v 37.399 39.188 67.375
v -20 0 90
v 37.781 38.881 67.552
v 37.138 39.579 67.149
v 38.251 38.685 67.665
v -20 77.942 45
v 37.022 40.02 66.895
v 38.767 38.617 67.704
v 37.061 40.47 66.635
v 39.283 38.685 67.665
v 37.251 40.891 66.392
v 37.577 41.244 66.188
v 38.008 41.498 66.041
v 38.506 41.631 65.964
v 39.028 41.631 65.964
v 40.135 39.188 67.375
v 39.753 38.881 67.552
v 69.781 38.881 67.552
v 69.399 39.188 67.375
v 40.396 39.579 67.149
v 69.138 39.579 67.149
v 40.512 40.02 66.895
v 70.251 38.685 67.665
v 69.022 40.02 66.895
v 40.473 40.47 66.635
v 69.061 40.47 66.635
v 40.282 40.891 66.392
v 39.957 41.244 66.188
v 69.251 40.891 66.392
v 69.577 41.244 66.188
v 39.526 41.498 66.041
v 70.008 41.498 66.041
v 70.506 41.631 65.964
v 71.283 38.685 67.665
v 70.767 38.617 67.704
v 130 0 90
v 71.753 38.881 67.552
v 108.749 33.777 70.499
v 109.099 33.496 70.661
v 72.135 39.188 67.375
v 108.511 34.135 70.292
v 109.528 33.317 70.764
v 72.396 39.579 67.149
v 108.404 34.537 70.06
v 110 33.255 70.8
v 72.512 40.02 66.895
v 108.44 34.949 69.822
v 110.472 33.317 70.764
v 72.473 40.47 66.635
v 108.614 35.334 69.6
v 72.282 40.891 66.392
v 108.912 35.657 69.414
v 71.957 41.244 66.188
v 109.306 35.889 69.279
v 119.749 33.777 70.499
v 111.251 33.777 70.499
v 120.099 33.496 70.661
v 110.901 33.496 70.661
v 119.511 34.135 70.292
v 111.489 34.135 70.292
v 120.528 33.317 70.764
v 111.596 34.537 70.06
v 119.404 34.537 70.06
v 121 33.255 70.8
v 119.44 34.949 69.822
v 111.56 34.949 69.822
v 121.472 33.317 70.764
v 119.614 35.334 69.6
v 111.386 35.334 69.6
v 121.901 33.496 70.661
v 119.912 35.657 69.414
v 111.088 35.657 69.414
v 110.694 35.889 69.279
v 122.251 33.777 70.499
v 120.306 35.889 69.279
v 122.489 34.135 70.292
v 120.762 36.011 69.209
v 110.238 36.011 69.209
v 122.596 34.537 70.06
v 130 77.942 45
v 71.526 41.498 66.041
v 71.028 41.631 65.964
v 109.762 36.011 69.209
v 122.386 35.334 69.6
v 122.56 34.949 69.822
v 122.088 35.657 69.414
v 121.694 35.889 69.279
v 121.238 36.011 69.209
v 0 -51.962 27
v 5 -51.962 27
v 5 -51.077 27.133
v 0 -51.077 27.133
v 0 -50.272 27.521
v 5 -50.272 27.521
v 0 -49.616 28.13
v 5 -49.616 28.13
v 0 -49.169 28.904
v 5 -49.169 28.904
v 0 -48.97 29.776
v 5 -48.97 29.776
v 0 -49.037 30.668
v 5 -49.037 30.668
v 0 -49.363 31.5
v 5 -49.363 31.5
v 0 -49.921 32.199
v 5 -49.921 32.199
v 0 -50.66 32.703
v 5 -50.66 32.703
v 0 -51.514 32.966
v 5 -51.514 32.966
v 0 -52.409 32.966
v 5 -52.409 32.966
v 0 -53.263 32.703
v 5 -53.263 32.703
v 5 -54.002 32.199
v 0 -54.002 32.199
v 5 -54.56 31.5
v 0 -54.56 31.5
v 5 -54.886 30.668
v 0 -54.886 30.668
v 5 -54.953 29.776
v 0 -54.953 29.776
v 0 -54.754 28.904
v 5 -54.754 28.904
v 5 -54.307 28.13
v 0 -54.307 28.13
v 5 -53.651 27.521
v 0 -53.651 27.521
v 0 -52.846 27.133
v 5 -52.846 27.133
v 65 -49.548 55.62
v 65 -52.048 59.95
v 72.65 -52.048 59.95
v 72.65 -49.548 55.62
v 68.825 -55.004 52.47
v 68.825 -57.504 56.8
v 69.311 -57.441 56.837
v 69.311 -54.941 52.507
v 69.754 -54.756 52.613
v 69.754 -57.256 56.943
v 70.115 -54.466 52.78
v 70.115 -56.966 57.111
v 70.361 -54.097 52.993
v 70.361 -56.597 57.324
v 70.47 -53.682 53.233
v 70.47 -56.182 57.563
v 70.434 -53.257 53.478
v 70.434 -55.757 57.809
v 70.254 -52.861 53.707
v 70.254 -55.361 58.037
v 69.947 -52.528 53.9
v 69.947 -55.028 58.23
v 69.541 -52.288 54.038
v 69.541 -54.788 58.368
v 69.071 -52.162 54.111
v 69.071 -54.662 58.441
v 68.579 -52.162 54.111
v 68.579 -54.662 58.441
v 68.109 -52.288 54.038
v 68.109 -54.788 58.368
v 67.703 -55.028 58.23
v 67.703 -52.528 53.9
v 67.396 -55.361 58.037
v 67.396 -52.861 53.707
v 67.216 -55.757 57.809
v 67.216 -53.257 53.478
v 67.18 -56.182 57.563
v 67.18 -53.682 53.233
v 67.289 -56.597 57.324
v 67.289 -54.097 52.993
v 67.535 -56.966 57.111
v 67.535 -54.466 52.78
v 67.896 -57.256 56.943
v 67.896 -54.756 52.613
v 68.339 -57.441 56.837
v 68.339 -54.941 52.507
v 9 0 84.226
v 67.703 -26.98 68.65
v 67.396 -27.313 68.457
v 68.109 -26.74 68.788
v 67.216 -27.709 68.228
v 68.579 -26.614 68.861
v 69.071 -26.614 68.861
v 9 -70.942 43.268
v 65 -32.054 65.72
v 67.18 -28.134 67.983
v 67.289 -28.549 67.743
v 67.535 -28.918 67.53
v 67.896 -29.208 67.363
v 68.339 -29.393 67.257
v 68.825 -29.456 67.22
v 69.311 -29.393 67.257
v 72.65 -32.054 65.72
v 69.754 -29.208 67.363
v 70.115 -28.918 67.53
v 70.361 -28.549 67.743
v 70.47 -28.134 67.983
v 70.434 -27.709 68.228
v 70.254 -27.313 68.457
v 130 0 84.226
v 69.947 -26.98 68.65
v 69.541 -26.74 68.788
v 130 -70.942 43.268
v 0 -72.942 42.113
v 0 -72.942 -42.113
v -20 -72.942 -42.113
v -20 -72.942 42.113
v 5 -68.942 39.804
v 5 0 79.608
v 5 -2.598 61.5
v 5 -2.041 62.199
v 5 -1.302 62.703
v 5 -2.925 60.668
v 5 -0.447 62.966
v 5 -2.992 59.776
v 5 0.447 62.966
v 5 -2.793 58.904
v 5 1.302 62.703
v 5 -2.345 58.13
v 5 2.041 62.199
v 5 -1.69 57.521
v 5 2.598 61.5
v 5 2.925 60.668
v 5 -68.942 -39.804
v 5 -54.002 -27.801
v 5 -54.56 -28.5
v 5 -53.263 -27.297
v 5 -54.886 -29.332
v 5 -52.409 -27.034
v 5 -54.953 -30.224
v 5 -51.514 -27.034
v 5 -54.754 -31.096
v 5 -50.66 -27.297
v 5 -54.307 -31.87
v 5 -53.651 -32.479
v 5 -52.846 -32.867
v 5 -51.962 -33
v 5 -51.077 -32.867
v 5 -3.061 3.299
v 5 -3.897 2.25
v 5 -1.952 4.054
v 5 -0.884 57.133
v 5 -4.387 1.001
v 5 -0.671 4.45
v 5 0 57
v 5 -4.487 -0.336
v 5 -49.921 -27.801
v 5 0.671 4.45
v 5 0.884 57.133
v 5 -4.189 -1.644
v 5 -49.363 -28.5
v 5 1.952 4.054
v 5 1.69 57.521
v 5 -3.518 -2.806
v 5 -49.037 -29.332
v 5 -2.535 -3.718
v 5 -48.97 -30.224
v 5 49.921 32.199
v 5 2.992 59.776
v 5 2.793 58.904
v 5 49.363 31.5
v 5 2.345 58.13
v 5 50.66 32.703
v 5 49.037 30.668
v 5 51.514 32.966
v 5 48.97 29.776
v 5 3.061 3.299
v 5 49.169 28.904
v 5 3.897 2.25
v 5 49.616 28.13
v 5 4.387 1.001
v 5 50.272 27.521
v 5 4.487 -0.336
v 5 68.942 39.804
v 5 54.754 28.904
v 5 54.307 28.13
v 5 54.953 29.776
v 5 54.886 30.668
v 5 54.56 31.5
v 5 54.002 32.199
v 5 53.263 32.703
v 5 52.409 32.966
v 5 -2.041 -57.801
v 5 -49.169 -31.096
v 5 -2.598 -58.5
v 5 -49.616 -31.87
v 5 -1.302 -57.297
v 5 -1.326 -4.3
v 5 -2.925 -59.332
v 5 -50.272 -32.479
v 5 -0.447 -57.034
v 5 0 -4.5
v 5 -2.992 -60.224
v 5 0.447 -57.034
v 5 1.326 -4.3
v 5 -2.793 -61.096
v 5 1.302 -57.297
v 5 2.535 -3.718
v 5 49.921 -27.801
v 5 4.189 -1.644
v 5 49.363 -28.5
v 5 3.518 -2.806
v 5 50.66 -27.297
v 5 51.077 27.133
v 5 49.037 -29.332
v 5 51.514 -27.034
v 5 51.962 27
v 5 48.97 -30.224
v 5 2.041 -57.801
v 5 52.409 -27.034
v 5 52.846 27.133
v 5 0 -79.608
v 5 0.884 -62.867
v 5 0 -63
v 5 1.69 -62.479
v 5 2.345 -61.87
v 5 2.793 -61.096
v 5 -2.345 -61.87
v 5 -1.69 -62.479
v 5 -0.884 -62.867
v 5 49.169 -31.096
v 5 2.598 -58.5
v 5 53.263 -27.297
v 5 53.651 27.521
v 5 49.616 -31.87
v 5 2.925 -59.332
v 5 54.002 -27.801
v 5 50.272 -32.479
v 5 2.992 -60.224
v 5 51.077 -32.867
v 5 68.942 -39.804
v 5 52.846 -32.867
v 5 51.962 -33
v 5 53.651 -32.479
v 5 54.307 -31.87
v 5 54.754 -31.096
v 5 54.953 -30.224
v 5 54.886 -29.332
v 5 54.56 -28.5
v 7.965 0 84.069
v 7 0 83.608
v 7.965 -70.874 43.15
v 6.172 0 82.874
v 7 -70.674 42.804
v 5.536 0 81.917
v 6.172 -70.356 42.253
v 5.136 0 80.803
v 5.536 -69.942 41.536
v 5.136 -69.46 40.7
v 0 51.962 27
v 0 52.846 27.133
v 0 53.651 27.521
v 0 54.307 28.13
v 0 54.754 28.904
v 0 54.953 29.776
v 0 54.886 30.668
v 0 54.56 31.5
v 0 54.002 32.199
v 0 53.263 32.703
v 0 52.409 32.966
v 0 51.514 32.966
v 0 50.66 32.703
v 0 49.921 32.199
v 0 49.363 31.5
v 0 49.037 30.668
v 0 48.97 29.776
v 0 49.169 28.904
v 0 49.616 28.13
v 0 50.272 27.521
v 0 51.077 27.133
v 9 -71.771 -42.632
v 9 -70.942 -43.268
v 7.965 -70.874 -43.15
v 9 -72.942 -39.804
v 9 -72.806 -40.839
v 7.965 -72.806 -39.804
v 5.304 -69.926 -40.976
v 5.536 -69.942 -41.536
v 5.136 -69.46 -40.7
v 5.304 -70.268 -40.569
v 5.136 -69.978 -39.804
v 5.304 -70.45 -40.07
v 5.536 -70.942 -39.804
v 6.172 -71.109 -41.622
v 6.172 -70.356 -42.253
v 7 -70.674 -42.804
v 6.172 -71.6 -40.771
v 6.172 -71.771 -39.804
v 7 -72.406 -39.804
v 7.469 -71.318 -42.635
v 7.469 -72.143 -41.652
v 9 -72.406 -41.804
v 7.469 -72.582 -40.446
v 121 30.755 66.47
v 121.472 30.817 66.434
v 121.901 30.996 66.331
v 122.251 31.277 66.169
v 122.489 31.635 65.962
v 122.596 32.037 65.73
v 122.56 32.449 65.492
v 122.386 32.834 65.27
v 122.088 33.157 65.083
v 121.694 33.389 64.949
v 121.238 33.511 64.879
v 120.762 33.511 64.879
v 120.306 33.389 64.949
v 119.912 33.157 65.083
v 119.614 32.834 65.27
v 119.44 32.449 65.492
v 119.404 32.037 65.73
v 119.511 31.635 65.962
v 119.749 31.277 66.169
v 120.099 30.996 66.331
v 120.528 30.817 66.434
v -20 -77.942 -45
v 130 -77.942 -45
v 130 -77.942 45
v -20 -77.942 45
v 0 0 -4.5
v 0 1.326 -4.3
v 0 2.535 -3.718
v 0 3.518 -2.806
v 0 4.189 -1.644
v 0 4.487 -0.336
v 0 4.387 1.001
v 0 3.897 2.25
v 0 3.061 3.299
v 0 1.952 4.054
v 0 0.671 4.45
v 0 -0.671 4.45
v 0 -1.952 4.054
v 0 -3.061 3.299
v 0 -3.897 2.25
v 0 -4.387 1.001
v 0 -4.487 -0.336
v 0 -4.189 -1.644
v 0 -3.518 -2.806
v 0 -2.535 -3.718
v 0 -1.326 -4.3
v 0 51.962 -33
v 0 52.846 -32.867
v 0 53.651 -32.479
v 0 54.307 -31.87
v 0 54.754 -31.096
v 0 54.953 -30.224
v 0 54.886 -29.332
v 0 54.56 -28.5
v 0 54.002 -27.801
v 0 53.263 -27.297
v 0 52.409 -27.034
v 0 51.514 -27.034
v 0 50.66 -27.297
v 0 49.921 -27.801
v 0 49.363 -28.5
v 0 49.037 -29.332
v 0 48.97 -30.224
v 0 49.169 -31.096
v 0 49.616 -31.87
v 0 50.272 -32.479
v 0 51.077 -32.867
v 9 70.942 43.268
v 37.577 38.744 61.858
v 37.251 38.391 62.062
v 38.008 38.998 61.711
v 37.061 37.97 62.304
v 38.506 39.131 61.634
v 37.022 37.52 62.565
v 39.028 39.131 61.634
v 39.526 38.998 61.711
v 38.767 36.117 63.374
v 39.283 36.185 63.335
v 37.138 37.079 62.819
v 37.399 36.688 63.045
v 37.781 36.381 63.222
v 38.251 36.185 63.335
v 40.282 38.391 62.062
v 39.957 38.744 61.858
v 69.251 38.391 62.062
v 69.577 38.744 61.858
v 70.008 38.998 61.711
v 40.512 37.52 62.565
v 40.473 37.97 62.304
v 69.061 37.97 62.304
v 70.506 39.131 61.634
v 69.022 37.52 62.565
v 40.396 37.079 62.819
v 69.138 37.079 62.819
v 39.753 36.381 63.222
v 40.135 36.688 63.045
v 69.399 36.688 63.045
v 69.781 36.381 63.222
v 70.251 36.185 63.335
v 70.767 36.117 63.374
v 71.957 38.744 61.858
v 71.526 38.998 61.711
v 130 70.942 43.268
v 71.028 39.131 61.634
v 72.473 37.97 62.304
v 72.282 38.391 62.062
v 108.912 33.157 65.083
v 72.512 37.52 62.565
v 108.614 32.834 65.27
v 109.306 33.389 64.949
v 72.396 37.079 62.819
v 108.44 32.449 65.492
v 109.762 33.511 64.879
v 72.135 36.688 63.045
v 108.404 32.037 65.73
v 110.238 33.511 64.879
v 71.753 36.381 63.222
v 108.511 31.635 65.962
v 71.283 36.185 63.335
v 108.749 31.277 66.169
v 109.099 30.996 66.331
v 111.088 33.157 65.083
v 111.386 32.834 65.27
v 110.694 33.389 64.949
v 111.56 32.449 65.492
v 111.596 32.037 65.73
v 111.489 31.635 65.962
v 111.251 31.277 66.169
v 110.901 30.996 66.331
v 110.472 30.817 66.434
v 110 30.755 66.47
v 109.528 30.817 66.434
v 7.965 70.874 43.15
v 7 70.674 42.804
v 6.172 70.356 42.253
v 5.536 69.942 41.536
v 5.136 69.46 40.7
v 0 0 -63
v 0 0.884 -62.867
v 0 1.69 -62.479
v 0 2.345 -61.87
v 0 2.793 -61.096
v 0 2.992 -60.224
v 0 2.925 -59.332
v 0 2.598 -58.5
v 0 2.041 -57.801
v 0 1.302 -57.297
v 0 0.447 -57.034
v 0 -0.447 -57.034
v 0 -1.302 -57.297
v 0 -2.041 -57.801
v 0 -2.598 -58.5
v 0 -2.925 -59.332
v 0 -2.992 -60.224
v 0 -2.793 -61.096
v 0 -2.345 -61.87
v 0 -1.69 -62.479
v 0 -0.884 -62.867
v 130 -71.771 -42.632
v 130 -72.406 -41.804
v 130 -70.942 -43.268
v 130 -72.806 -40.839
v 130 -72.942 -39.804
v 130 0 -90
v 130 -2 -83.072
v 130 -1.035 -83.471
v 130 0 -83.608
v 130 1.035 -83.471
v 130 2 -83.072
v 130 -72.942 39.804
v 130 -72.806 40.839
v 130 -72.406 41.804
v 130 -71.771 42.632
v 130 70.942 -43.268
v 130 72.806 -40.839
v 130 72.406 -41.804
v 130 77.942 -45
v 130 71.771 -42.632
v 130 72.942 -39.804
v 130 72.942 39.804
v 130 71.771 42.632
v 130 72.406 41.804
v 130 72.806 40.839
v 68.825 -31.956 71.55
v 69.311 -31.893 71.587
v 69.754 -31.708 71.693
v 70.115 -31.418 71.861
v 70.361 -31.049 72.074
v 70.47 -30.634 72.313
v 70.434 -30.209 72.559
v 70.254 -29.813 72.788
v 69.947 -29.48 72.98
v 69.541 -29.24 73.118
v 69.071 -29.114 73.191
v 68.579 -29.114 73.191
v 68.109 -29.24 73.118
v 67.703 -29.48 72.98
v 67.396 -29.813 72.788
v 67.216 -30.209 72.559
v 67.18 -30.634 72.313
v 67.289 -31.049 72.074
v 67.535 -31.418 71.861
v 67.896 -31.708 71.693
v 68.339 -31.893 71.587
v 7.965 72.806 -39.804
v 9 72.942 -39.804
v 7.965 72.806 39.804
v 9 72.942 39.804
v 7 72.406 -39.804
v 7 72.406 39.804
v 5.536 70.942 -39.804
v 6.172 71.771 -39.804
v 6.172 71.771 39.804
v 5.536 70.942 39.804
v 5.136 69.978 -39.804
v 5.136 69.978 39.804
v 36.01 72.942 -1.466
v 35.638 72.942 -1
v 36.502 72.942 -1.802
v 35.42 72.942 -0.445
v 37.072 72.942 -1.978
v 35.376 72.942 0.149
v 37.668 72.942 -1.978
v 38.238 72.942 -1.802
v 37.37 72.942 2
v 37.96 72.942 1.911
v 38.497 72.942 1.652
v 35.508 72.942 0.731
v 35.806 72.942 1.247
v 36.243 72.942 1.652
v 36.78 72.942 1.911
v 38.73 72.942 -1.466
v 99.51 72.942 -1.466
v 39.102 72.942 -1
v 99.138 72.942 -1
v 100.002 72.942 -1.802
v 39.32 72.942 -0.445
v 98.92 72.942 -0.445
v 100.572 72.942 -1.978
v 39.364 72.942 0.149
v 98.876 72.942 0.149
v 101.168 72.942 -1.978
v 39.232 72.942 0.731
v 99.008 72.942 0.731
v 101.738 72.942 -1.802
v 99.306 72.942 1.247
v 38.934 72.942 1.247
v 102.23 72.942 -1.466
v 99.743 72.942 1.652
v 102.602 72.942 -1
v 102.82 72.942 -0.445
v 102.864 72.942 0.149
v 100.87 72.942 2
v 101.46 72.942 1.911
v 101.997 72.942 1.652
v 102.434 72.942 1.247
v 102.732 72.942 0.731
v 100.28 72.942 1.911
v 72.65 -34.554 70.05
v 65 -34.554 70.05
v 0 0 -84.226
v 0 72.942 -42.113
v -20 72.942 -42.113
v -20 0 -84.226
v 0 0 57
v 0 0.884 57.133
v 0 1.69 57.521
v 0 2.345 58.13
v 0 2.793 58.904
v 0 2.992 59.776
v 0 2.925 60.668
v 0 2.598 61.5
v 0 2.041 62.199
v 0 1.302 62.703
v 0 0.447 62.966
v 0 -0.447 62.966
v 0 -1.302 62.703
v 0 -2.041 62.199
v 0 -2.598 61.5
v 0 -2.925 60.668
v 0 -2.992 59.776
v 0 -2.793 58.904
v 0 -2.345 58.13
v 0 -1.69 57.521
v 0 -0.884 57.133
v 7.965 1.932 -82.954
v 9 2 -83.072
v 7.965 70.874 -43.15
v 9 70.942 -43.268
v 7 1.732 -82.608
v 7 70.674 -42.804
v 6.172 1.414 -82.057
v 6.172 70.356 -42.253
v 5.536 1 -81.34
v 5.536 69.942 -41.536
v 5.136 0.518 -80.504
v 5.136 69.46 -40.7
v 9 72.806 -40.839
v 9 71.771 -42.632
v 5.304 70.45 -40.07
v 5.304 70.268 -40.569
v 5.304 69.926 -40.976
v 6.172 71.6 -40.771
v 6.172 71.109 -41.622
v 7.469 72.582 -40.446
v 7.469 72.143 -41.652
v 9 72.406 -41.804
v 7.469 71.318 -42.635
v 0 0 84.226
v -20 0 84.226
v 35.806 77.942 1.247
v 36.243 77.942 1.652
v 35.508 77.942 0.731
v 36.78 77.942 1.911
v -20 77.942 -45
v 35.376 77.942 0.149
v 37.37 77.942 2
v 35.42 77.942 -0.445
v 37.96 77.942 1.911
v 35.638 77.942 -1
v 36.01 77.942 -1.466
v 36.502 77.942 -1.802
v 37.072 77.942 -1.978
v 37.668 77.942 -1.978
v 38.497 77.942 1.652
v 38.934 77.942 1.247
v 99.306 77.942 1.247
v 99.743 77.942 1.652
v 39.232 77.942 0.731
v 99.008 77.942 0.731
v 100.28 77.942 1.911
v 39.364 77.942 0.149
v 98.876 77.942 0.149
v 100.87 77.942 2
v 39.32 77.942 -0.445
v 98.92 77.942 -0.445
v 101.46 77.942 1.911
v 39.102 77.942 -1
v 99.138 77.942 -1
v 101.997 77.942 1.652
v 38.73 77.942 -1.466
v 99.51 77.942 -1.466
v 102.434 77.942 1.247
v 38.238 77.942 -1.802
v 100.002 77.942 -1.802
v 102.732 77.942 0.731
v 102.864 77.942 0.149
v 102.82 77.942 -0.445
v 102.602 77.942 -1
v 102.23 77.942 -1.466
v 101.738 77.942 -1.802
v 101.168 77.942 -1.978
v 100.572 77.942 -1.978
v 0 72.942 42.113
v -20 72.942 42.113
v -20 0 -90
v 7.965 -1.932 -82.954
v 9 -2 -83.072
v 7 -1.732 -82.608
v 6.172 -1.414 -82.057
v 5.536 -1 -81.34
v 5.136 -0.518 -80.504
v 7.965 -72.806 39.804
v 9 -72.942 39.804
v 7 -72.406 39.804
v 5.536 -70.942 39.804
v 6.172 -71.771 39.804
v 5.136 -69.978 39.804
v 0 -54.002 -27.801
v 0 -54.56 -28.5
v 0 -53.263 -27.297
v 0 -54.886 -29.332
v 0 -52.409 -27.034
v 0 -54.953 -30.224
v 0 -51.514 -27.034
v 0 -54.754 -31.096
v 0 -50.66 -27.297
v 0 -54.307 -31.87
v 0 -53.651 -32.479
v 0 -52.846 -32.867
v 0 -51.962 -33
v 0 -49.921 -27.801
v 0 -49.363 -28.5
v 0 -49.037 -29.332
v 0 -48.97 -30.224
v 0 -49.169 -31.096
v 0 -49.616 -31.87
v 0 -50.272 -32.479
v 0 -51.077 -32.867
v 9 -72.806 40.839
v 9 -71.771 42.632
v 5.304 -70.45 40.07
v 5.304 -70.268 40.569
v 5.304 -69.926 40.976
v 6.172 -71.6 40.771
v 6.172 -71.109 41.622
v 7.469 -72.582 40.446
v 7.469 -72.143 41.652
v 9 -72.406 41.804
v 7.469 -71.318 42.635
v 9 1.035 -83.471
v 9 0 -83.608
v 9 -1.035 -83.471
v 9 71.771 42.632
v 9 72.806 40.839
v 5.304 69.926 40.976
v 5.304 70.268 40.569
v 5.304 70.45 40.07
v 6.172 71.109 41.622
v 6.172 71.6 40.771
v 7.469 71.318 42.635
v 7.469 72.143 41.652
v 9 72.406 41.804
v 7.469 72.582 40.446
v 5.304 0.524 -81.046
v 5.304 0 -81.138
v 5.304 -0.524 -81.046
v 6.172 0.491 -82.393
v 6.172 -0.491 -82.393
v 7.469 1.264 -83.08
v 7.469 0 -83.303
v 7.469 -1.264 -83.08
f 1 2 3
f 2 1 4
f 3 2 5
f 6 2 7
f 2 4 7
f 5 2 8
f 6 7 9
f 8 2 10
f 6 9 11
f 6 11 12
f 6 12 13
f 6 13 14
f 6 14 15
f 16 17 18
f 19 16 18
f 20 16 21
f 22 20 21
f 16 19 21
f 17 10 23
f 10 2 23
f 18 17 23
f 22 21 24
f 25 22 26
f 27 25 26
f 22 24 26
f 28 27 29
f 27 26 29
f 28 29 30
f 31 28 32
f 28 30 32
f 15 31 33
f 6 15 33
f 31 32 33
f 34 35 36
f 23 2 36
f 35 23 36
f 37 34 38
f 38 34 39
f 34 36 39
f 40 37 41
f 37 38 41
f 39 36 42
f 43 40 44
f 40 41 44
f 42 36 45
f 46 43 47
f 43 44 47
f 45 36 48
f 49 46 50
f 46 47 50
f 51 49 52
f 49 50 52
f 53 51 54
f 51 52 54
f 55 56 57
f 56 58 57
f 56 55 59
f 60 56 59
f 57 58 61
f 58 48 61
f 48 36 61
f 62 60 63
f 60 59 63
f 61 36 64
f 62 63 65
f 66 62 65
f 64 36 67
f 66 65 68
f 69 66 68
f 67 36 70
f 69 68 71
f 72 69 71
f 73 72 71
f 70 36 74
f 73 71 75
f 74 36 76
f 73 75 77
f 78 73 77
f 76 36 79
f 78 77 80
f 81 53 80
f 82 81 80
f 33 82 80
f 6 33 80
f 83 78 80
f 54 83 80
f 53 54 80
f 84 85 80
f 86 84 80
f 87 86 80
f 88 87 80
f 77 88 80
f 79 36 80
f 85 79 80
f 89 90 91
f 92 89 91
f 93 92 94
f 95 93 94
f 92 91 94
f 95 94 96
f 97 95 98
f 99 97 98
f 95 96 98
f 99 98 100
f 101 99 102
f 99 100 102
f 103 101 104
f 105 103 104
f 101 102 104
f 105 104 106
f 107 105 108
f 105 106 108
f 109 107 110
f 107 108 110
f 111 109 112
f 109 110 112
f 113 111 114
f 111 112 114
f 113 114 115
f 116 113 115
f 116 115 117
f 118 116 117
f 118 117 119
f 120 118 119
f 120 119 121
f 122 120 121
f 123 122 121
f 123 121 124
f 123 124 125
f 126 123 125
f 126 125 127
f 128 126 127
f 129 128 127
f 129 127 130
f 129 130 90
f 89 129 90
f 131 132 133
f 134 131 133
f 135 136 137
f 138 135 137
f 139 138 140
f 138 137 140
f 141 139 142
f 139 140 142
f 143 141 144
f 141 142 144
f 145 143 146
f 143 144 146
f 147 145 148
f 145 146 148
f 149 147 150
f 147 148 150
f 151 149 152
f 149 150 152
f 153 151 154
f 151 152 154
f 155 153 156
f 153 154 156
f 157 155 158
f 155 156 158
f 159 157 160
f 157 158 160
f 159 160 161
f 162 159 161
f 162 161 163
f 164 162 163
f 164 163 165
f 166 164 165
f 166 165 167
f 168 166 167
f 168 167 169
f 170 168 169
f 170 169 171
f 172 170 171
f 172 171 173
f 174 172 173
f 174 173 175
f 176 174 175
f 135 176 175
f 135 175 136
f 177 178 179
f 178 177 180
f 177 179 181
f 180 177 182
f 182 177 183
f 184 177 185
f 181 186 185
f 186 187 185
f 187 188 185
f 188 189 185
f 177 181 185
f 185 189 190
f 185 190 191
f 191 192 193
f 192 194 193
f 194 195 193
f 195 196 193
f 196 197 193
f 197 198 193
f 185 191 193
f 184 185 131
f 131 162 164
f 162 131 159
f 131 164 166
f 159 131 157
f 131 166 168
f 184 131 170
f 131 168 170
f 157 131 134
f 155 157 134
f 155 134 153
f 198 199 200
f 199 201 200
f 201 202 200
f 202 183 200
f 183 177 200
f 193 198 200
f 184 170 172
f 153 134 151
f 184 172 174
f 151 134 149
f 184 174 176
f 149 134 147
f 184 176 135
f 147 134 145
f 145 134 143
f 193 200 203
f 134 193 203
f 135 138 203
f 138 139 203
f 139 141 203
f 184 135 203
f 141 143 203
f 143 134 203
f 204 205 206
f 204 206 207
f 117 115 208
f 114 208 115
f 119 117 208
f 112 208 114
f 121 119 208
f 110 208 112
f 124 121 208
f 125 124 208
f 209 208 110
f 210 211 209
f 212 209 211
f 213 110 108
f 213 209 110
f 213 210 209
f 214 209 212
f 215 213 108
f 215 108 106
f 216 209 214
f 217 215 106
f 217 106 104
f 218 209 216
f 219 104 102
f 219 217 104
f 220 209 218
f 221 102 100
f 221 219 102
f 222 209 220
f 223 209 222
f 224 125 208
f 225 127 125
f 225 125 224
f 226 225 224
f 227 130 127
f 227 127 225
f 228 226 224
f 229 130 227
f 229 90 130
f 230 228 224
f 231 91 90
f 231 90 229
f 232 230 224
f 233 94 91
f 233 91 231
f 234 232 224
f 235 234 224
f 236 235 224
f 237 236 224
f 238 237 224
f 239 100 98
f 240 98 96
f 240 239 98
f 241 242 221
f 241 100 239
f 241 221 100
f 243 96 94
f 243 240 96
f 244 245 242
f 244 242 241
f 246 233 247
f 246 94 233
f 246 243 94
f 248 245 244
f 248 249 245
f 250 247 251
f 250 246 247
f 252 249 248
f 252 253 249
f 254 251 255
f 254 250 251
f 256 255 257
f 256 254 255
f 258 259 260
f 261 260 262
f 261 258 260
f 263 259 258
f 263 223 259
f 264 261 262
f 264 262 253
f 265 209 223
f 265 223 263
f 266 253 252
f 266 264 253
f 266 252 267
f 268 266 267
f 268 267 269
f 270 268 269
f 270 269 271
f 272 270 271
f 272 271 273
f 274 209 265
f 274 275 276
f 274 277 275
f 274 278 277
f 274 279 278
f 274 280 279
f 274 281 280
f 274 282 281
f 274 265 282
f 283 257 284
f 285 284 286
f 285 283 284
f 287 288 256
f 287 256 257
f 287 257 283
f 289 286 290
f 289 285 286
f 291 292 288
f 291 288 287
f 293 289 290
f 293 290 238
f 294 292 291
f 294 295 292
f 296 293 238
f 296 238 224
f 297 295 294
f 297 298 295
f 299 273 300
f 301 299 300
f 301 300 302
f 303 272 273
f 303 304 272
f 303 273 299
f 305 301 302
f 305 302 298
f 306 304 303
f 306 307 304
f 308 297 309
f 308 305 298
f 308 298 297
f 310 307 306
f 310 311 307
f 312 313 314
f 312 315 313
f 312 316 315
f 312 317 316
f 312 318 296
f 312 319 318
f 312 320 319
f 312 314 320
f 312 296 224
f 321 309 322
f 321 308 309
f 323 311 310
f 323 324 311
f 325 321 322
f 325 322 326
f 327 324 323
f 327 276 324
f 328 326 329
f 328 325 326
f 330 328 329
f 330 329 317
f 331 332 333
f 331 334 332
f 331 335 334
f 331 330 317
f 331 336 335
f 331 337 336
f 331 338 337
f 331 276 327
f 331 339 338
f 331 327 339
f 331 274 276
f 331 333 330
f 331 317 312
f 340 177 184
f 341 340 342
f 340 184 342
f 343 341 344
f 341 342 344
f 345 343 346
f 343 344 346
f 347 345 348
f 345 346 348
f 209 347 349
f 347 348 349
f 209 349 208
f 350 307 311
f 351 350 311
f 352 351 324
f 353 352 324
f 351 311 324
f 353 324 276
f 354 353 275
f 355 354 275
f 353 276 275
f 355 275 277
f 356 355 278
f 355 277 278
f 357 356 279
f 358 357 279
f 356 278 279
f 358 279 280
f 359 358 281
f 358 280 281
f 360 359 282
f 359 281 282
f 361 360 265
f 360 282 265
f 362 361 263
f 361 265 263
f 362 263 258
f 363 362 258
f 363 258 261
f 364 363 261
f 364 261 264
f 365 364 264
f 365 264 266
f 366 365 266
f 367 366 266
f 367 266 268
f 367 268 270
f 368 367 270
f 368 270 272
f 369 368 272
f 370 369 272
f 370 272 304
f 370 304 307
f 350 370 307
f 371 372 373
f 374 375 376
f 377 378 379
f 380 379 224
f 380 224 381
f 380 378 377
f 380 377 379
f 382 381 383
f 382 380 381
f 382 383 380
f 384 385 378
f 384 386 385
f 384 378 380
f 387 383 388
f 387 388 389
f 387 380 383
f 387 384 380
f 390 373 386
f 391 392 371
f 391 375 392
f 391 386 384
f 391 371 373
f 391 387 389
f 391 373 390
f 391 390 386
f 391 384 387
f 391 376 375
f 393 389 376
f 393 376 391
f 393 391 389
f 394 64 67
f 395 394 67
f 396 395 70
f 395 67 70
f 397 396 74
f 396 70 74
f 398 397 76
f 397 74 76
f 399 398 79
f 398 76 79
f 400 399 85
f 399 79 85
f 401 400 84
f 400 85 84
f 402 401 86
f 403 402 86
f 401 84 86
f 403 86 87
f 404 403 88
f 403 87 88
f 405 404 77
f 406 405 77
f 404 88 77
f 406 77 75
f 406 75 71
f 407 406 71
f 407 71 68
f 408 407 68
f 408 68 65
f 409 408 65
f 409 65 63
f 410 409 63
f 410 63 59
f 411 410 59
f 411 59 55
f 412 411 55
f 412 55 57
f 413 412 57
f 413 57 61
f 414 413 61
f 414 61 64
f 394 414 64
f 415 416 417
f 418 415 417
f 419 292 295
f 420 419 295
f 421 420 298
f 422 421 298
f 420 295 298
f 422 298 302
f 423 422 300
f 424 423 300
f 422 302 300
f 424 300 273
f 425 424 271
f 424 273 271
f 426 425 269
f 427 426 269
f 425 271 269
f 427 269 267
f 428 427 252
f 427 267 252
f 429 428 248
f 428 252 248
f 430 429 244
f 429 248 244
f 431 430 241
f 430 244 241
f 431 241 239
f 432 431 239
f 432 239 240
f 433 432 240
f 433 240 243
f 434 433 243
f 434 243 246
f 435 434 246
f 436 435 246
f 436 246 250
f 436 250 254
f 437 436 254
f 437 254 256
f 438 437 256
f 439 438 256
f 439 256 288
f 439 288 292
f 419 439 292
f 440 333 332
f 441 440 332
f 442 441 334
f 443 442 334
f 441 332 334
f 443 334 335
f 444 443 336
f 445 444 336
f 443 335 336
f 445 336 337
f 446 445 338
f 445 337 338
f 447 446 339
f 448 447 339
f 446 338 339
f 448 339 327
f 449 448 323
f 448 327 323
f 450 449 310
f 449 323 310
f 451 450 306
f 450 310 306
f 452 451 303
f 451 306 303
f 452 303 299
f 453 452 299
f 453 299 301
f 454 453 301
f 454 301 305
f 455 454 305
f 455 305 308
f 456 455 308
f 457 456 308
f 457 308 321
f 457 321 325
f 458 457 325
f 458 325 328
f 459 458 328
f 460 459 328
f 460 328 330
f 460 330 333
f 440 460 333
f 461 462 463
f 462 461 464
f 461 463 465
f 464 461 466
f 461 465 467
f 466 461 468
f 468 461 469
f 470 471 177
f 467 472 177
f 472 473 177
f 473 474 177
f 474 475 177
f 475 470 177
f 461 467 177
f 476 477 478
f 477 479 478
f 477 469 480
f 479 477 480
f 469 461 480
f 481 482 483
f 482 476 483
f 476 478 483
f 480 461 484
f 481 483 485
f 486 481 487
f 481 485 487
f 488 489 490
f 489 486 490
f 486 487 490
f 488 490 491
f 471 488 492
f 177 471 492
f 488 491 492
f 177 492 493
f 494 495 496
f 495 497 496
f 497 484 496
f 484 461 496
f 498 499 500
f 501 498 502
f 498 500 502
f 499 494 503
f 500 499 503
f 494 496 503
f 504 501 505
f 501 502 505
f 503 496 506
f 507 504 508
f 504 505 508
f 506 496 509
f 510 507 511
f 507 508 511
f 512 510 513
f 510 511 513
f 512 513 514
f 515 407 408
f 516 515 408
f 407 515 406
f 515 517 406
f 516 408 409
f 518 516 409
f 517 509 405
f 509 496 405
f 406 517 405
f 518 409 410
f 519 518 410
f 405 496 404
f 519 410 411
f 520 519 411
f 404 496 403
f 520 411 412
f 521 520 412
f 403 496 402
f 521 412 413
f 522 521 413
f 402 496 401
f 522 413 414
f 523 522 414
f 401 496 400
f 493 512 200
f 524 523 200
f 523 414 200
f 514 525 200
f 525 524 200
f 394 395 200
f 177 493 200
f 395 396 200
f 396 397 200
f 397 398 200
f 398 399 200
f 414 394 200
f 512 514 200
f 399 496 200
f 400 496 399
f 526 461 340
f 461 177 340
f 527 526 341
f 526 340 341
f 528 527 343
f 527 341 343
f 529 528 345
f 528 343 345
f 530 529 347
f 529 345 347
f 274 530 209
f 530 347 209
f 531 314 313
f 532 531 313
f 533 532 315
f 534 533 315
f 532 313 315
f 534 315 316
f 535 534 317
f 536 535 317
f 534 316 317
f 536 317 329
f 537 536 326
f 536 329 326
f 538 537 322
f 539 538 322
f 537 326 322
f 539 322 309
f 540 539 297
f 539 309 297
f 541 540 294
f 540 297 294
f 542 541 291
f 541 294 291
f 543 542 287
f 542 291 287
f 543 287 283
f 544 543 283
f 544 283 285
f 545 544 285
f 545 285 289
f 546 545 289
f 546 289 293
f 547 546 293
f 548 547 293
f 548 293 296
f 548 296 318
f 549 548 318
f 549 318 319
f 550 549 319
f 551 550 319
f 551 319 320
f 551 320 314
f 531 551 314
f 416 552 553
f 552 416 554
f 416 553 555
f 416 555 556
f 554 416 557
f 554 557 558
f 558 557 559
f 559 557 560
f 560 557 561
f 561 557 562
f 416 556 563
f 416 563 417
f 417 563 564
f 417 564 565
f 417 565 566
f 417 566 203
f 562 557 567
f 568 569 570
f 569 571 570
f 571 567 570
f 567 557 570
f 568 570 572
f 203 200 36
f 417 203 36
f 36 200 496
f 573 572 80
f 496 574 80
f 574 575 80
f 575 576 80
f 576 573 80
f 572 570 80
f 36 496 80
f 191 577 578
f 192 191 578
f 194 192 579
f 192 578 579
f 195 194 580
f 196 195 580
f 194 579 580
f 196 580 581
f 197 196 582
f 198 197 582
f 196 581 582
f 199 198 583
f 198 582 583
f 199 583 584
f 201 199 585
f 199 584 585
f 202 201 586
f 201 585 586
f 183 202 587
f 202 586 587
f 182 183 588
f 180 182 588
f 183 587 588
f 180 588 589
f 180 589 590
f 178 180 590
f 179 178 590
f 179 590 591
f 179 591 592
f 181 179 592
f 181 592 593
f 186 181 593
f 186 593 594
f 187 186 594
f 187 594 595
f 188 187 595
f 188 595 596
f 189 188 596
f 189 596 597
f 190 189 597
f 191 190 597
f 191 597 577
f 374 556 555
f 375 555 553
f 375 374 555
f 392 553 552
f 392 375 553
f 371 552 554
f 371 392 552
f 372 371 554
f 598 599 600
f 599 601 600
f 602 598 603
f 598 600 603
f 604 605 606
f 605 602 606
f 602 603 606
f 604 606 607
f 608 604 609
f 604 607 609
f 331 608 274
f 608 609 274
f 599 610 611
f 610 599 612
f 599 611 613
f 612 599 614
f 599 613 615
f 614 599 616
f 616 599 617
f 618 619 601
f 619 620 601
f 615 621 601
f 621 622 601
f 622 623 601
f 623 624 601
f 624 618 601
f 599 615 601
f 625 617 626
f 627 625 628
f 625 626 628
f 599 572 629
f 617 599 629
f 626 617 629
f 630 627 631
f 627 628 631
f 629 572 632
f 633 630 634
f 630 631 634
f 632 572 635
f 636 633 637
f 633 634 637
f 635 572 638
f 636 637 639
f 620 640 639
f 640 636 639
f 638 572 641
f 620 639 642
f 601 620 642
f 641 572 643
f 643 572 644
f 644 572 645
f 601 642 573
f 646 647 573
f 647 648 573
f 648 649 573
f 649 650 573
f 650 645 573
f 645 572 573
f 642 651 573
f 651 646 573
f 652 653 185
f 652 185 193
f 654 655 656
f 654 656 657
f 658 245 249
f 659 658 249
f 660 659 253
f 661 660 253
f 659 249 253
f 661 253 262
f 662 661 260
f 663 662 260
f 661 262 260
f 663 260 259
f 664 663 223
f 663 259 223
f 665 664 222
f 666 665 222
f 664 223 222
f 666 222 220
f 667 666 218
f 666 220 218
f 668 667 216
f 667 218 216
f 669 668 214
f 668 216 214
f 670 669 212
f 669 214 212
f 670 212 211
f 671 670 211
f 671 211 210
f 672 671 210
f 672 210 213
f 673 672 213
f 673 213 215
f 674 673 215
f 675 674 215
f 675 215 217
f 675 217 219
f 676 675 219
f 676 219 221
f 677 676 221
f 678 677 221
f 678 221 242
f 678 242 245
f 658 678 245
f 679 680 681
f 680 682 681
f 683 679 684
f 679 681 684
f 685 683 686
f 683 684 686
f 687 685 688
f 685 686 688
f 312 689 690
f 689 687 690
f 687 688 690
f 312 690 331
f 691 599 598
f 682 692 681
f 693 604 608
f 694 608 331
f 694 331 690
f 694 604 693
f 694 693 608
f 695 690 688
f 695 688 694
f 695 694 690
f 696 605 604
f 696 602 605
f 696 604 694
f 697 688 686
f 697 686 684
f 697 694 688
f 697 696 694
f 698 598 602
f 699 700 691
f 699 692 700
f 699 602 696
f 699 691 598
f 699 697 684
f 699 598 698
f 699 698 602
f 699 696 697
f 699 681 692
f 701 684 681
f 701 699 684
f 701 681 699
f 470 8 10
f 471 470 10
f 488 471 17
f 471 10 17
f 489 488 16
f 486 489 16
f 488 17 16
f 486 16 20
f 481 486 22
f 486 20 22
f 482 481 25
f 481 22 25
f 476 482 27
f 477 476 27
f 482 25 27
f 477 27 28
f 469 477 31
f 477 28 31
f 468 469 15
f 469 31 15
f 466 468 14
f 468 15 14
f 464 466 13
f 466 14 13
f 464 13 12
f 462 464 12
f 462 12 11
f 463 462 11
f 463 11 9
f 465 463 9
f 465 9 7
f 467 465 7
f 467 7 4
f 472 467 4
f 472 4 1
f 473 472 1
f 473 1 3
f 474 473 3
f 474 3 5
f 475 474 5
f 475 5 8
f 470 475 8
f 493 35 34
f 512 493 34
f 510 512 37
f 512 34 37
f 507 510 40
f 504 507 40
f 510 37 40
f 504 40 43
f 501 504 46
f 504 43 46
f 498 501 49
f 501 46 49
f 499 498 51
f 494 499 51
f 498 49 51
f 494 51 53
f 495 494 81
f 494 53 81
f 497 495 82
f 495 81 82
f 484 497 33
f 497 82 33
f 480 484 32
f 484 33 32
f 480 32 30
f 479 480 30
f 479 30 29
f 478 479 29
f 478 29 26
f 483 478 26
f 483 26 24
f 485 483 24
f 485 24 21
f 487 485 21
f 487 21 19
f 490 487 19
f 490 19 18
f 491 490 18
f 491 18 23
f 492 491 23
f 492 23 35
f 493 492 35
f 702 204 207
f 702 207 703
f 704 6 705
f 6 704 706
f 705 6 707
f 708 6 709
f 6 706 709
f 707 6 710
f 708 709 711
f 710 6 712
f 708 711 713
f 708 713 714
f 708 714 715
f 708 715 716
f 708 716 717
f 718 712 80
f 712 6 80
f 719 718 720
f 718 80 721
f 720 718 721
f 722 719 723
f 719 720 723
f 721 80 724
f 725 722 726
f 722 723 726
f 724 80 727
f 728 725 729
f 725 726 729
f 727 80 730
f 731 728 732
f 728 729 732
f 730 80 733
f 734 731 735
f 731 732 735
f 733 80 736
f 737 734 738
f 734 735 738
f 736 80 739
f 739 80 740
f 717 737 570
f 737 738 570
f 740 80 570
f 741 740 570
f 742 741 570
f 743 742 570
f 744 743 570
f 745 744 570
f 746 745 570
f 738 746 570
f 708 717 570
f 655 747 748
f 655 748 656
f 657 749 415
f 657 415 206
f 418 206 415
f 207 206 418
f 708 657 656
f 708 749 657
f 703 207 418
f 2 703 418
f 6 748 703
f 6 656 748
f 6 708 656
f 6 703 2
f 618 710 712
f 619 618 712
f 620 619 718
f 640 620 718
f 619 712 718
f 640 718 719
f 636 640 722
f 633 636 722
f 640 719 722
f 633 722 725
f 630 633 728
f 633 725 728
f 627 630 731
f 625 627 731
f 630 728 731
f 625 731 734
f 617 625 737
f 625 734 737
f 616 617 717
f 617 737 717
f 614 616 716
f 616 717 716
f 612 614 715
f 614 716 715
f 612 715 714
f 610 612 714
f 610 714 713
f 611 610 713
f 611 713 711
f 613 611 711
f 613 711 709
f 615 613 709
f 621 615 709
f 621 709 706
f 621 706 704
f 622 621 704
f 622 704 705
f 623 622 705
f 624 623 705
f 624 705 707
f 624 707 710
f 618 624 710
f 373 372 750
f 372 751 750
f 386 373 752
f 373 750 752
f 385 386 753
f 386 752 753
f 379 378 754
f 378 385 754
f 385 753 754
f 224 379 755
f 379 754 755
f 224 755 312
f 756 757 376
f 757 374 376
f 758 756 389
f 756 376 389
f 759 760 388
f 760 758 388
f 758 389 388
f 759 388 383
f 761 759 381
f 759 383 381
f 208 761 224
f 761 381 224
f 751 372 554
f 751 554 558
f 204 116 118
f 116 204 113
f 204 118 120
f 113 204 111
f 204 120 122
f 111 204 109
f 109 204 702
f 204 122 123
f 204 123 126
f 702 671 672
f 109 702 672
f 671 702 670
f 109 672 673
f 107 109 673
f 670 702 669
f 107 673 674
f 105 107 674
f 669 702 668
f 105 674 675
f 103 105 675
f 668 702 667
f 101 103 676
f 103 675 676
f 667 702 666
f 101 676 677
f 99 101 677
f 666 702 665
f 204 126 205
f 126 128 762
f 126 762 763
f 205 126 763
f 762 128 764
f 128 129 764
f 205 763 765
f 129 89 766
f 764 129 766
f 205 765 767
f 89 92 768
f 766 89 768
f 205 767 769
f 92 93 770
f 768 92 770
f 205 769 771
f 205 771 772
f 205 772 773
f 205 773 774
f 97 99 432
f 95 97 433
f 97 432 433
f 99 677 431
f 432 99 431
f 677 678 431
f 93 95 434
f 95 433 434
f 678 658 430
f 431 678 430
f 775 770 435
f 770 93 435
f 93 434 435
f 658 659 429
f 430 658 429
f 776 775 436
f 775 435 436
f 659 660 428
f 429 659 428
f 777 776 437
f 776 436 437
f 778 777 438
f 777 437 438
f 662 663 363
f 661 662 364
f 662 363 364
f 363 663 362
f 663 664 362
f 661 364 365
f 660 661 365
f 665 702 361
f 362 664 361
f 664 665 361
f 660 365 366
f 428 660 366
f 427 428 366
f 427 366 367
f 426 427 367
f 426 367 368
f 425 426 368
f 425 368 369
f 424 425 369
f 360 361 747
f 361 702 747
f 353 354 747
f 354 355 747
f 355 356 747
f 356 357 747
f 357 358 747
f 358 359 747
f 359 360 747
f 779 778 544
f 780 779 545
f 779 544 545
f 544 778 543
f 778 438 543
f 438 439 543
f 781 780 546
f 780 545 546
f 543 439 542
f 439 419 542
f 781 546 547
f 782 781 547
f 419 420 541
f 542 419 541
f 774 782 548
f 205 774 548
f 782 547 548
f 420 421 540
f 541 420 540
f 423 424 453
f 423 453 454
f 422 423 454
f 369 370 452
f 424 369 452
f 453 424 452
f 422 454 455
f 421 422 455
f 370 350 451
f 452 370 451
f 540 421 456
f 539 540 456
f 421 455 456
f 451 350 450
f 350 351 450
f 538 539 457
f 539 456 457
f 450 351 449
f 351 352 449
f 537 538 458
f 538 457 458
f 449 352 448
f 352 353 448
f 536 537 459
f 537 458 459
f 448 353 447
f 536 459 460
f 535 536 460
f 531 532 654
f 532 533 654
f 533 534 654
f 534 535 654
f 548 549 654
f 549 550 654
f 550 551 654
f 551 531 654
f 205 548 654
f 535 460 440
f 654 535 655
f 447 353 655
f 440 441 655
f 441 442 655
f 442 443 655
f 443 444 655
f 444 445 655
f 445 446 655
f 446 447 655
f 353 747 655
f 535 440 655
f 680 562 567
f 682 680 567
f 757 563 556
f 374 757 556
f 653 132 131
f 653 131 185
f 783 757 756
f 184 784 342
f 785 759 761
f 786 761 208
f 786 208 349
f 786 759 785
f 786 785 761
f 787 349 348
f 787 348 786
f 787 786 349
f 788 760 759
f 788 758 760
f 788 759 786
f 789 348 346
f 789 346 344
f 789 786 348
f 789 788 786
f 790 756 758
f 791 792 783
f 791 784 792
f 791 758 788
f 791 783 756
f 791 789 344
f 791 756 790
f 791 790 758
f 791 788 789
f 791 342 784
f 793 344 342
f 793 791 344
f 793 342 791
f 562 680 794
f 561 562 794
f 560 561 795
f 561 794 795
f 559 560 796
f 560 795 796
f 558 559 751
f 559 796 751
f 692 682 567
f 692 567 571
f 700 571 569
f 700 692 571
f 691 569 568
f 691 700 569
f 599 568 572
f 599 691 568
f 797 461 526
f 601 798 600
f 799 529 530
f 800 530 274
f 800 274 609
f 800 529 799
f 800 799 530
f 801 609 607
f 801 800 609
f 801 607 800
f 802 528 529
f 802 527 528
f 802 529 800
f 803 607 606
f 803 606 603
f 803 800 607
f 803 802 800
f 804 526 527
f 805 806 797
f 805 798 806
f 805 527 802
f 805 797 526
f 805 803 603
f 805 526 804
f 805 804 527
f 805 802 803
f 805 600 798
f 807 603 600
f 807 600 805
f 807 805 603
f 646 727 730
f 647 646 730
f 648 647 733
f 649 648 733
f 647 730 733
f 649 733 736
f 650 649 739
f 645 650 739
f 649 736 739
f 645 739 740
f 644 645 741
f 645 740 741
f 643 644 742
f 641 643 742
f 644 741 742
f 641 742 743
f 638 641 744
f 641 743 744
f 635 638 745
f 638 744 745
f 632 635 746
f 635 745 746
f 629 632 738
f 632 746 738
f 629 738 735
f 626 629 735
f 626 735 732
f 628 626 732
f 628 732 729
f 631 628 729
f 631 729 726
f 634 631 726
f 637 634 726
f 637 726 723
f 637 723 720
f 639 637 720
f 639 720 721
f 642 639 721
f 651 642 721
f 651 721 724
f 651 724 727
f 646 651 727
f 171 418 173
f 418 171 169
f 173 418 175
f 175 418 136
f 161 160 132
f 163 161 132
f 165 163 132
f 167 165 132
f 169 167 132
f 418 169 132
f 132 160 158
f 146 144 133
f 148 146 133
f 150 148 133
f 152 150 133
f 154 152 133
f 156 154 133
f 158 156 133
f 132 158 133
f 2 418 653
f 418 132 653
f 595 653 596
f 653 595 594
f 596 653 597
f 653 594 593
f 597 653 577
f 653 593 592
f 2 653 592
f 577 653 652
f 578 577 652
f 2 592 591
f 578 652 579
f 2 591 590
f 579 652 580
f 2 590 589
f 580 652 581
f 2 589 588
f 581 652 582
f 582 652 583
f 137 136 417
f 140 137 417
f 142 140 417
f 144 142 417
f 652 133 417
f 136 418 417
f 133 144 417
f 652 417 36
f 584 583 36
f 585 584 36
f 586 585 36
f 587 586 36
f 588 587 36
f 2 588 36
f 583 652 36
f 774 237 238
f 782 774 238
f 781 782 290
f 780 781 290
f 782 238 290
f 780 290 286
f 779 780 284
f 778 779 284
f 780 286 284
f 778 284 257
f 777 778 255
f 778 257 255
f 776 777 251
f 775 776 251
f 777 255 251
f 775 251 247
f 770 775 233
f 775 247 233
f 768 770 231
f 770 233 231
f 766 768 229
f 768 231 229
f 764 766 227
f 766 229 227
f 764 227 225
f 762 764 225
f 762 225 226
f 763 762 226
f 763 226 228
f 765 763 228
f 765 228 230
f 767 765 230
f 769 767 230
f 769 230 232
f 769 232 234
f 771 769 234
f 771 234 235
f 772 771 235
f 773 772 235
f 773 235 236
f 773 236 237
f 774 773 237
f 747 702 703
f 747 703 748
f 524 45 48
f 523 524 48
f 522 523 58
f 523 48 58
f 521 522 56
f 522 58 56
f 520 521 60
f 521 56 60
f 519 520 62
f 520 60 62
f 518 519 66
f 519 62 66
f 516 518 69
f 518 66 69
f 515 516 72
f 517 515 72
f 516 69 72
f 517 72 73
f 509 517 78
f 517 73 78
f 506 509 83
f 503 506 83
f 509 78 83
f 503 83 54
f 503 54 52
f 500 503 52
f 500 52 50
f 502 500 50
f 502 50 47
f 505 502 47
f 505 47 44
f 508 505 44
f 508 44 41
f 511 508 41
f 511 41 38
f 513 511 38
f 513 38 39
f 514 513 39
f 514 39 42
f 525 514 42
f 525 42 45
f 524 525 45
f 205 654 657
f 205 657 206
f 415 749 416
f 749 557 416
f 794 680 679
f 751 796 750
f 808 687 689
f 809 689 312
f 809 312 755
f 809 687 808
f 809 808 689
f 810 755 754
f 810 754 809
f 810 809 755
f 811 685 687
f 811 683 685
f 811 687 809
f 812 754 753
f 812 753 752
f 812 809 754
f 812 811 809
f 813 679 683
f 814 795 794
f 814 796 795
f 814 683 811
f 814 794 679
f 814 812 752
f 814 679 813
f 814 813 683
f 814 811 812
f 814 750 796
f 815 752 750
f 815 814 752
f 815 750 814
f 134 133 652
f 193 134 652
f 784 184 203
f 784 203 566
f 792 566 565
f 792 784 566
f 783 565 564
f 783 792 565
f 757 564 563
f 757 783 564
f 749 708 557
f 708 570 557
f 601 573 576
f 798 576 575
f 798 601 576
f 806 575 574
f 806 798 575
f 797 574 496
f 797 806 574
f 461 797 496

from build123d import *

# Parameters (mm, degrees)
BOSS_EXTRUDE1_DEPTH = 200
CUT_EXTRUDE1_DEPTH  = 195
SKETCH5_R           = 1.65
SKETCH5_W           = 7.65
SKETCH5_H           = 20.2
CUT_EXTRUDE4_DEPTH  = 70
SKETCH7_R           = 4.5
SKETCH7_R_2         = 3
CUT_EXTRUDE6_DEPTH  = 70
FILLET1_R           = 4
CUT_EXTRUDE7_DEPTH  = 70
SKETCH10_R          = 1.6
CUT_EXTRUDE8_DEPTH  = 6
BOSS_EXTRUDE2_DEPTH = 20
SKETCH12_R          = 2
CUT_EXTRUDE9_DEPTH  = 10
SKETCH13_R          = 1.75
CUT_EXTRUDE10_DEPTH = 10


with BuildPart() as part:
    # Sketch1 → Boss-Extrude1 (new body)
    with BuildSketch(Plane(origin=(0, 0, 0), x_dir=(0, 0, -1), z_dir=(1, 0, 0))):
        Polygon((90, 0), (45, 77.942286341), (-45, 77.942286341), (-90, 0), (-45, -77.942286341), (45, -77.942286341), align=None)
    extrude(amount=BOSS_EXTRUDE1_DEPTH)

    # Sketch2 → Cut-Extrude1 (cut)
    with BuildSketch(Plane(origin=(200, 0, 0), x_dir=(0, 0, -1), z_dir=(1, 0, 0))):
        Polygon((84.226497308, 0), (42.113248654, 72.942286341), (-42.113248654, 72.942286341), (-84.226497308, 0), (-42.113248654, -72.942286341), (42.113248654, -72.942286341), align=None)
    extrude(amount=-CUT_EXTRUDE1_DEPTH, mode=Mode.SUBTRACT)

    # Sketch5 → Cut-Extrude4 (cut)
    with BuildSketch(Plane(origin=(0, -38.97114317, 67.5), x_dir=(1, 0, 0), z_dir=(0, -0.500000000000007, 0.8660254037844347))):
        with Locations(Location((68.825, 9.75, 0), (0, 0, 270))):
            Circle(SKETCH5_R)
        with Locations(Location((68.825, -19.75, 0), (0, 0, 270))):
            Circle(SKETCH5_R)
        with Locations((68.825, -5)):
            Rectangle(SKETCH5_W, SKETCH5_H)
    extrude(amount=-CUT_EXTRUDE4_DEPTH, mode=Mode.SUBTRACT)

    # Sketch7 → Cut-Extrude6 (cut)
    with BuildSketch(Plane(origin=(5, 0, 0), x_dir=(0, 0, -1), z_dir=(1, 0, 0))):
        Circle(SKETCH7_R)
        with Locations((60, 0)):
            Circle(SKETCH7_R_2)
        with Locations((30, 51.961524227)):
            Circle(SKETCH7_R_2)
        with Locations((-30, 51.961524227)):
            Circle(SKETCH7_R_2)
        with Locations((-60, 0)):
            Circle(SKETCH7_R_2)
        with Locations((-30, -51.961524227)):
            Circle(SKETCH7_R_2)
        with Locations((30, -51.961524227)):
            Circle(SKETCH7_R_2)
    extrude(amount=-CUT_EXTRUDE6_DEPTH, mode=Mode.SUBTRACT)

    # Fillet1
    fillet1_edges = [part.edges().sort_by_distance(p)[0] for p in [
        (5, -36.47114317, -63.169872981),
        (102.5, 0, -84.226497308),
        (5, -72.942286341, 0),
        (102.5, -72.942286341, -42.113248654),
        (5, -36.47114317, 63.169872981),
        (102.5, -72.942286341, 42.113248654),
        (5, 36.47114317, 63.169872981),
        (5, 72.942286341, 0),
        (102.5, 72.942286341, 42.113248654),
        (5, 36.47114317, -63.169872981),
        (102.5, 72.942286341, -42.113248654),
    ]]
    fillet(fillet1_edges, radius=FILLET1_R)

    # Sketch9 → Cut-Extrude7 (cut)
    with BuildSketch(Plane(origin=(200, 0, 0), x_dir=(0, 0, -1), z_dir=(1, 0, 0))):
        Polygon((45, 77.942286341), (90, 0), (45, -77.942286341), (-45, -77.942286341), (-90, 0), (-45, 77.942286341), align=None)
    extrude(amount=-CUT_EXTRUDE7_DEPTH, mode=Mode.SUBTRACT)

    # Sketch10 → Cut-Extrude8 (cut)
    with BuildSketch(Plane(origin=(0, 38.97114317, 67.5), x_dir=(1, 0, 0), z_dir=(0, 0.49999999999999495, 0.8660254037844417))):
        with Locations(Location((110, -5, 0), (0, 0, 270))):
            Circle(SKETCH10_R)
        with Locations(Location((121, -5, 0), (0, 0, 270))):
            Circle(SKETCH10_R)
    extrude(amount=-CUT_EXTRUDE8_DEPTH, mode=Mode.SUBTRACT)

    # Sketch11 → Boss-Extrude2 (add)
    with BuildSketch(Plane.ZY):
        Polygon((90, 0), (45, 77.942286341), (-45, 77.942286341), (-90, 0), (-45, -77.942286341), (45, -77.942286341), align=None)
        Polygon((84.226497308, 0), (42.113248654, 72.942286341), (-42.113248654, 72.942286341), (-84.226497308, 0), (-42.113248654, -72.942286341), (42.113248654, -72.942286341), align=None, mode=Mode.SUBTRACT)
    extrude(amount=BOSS_EXTRUDE2_DEPTH)

    # Sketch12 → Cut-Extrude9 (cut)
    with BuildSketch(Plane(origin=(0, 77.942286341, 0), x_dir=(1, 0, 0), z_dir=(0, 1, 0))):
        with Locations(Location((100.87, 0, 0), (0, 0, 270))):
            Circle(SKETCH12_R)
        with Locations(Location((37.37, 0, 0), (0, 0, 270))):
            Circle(SKETCH12_R)
    extrude(amount=-CUT_EXTRUDE9_DEPTH, mode=Mode.SUBTRACT)

    # Sketch13 → Cut-Extrude10 (cut)
    with BuildSketch(Plane(origin=(0, 38.97114317, 67.5), x_dir=(1, 0, 0), z_dir=(0, 0.49999999999999983, 0.8660254037844387))):
        with Locations(Location((70.766818174, 1.341454493, 0), (0, 0, 270))):
            Circle(SKETCH13_R)
        with Locations(Location((38.766818174, 1.341454493, 0), (0, 0, 270))):
            Circle(SKETCH13_R)
    extrude(amount=-CUT_EXTRUDE10_DEPTH, mode=Mode.SUBTRACT)


solid = part.part
